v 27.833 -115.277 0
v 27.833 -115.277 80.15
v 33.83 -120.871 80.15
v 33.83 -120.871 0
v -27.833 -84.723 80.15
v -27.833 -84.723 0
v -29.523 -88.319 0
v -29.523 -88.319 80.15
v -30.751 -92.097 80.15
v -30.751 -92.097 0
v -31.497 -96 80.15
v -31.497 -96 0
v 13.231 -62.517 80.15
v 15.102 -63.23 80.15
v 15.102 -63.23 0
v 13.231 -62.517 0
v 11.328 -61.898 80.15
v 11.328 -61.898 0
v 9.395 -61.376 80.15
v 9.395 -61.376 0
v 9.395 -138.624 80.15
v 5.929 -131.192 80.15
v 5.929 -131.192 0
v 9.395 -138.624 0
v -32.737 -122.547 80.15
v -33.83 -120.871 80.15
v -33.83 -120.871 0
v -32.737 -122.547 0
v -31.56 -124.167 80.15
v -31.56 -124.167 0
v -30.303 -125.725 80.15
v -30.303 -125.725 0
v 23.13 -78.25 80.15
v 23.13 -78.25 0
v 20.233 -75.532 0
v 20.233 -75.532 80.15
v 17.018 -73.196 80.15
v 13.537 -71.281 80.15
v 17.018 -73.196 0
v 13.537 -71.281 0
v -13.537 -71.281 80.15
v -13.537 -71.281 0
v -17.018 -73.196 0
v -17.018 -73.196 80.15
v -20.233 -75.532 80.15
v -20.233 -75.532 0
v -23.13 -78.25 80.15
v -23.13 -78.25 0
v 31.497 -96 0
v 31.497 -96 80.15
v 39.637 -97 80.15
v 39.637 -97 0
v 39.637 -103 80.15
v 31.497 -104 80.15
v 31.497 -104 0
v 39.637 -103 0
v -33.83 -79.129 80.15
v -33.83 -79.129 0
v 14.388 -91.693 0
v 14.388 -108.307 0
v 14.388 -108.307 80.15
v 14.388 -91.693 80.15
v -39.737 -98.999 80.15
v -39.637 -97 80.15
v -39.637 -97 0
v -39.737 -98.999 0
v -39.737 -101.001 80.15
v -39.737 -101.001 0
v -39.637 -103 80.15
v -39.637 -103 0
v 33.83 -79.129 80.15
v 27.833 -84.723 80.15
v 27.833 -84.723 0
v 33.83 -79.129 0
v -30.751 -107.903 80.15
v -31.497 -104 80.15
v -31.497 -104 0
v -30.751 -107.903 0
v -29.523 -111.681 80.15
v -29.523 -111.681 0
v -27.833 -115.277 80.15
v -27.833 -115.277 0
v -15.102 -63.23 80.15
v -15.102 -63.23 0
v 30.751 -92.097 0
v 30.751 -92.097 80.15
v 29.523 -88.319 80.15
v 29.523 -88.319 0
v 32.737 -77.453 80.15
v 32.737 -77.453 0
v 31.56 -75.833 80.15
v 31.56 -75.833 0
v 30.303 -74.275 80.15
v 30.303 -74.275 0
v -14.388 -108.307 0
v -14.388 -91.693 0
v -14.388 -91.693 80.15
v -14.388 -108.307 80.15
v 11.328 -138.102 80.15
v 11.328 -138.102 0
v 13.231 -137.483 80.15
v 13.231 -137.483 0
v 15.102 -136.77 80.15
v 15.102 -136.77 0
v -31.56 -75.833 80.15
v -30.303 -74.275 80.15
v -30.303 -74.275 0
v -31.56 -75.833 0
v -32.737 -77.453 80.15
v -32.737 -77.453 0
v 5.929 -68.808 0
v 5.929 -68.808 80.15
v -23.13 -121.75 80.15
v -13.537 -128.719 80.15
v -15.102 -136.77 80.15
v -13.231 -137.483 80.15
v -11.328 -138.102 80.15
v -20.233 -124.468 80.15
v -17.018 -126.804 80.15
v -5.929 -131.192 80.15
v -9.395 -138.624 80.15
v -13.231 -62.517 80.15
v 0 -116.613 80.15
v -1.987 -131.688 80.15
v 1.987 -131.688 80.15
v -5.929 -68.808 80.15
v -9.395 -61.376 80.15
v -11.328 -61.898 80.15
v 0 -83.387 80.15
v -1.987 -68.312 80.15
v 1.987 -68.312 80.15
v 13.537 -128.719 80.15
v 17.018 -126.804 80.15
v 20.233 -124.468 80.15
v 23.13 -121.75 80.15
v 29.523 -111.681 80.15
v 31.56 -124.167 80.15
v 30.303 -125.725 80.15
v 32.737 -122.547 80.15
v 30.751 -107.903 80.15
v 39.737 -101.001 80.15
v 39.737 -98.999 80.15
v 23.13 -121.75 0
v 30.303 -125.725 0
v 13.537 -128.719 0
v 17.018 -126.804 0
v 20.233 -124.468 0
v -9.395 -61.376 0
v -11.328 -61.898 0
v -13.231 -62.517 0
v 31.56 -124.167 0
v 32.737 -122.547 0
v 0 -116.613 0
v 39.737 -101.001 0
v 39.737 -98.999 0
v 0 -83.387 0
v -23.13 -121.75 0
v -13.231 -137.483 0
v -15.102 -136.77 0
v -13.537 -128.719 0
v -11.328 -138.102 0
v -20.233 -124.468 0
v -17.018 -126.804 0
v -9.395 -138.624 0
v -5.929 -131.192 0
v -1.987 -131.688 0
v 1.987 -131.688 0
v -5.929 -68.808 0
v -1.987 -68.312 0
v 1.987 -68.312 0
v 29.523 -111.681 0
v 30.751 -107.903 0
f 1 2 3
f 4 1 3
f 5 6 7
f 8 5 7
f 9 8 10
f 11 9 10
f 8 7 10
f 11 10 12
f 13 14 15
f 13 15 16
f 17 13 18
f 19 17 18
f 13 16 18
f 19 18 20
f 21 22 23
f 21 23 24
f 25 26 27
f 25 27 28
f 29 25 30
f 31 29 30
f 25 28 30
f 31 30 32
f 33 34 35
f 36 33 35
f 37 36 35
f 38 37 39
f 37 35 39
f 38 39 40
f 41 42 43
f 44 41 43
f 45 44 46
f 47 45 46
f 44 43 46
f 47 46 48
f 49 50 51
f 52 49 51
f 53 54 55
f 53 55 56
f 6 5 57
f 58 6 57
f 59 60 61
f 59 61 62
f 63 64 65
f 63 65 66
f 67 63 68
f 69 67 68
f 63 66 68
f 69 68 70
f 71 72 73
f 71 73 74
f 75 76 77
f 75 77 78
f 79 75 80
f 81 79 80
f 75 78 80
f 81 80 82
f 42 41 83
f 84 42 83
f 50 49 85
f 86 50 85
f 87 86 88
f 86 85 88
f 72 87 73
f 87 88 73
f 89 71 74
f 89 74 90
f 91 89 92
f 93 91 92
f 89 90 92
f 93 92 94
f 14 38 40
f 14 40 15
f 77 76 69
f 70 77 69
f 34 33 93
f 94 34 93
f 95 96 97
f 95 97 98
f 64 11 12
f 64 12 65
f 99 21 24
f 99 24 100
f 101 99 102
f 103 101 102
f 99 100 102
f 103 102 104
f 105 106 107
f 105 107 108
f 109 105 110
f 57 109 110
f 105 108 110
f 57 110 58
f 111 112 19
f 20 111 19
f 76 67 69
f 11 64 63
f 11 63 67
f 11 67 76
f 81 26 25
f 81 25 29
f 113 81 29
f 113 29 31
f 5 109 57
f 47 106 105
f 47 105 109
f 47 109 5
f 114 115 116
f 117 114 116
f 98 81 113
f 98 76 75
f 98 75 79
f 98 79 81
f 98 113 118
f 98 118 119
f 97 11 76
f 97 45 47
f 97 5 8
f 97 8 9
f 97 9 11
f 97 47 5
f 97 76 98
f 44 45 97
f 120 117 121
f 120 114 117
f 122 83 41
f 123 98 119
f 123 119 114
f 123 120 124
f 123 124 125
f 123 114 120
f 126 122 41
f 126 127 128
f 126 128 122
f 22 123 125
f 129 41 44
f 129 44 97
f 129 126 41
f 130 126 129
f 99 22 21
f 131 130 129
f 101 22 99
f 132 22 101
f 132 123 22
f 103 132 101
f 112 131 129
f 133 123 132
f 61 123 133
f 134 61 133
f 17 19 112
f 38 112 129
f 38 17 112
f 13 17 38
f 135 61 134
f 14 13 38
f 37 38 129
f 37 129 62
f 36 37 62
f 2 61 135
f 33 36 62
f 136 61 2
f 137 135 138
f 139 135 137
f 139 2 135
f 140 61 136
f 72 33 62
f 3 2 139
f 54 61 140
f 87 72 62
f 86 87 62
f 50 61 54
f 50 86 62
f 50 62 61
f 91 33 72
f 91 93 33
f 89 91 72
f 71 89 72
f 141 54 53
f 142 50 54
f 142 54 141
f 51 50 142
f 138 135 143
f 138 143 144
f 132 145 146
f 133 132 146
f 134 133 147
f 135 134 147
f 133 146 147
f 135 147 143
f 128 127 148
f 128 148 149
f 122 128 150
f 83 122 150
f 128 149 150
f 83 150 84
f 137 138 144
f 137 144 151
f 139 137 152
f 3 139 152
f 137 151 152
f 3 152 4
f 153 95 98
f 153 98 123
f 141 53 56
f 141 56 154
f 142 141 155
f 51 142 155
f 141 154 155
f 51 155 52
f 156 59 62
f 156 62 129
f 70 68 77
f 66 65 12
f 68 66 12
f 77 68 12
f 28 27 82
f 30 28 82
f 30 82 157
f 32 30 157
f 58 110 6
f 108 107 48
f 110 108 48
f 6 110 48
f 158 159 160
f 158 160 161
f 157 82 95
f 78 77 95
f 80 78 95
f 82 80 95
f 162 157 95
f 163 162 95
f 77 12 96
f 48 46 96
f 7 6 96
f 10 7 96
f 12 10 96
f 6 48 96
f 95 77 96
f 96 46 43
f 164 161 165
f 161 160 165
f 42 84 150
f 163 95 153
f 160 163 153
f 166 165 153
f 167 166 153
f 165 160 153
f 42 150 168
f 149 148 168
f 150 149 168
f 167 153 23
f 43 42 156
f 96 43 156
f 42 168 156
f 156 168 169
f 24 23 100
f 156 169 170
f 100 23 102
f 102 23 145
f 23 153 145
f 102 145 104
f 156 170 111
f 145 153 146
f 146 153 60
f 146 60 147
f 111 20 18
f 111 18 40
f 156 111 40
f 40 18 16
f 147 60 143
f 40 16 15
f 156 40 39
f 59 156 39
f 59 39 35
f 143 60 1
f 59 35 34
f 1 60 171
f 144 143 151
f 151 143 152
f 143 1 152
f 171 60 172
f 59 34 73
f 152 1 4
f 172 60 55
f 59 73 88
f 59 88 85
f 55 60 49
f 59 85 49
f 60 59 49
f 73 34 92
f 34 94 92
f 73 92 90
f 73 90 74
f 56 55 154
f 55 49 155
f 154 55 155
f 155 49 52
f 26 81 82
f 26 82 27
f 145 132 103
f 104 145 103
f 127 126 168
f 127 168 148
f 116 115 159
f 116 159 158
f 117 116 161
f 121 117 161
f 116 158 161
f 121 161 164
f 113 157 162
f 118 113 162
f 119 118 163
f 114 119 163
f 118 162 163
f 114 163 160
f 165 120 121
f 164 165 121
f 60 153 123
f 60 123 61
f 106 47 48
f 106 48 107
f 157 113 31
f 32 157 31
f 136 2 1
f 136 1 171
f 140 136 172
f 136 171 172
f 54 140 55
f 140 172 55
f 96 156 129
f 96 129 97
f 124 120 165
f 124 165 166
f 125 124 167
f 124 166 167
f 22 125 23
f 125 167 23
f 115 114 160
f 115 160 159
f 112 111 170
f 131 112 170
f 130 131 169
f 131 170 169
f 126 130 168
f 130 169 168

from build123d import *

# Parameters (mm, degrees)
SKETCH011_R           = 31.75
PAD009_DEPTH          = 80.15
PAD010_DEPTH          = 80.15
POLARPATTERN006_COUNT = 10
POCKET010_DEPTH       = 80.151


with BuildPart() as part:
    # Sketch011 → Pad009 (new body)
    with BuildSketch(Plane.XY):
        Circle(SKETCH011_R)
    extrude(amount=PAD009_DEPTH)

    # Sketch009 → Pad010 (join)
    with BuildSketch(Plane.XY):
        with BuildLine():
            ThreePointArc((39.636631, -3), (39.75, 0), (39.636631, 3))
            Line((31.497024, 4), (39.636631, 3))
            Line((31.497024, 4), (21.166667, 0))
            Line((21.166667, 0), (31.497024, -4))
            Line((31.497024, -4), (39.636631, -3))
        make_face()
    pad010 = extrude(amount=PAD010_DEPTH)

    # PolarPattern006: Pad010 ×10 about axis
    polarpattern006_axis = Axis((0, 0, 0), (0, 0, 1))
    for i in range(1, POLARPATTERN006_COUNT):
        add(pad010.rotate(polarpattern006_axis, i * 360 / POLARPATTERN006_COUNT))

    # Sketch010 → Pocket010 (cut, through all)
    with BuildSketch(Plane.XY):
        Polygon((14.3875, 8.306627), (0, 16.613254), (-14.3875, 8.306627), (-14.3875, -8.306627), (0, -16.613254), (14.3875, -8.306627), align=None)
    extrude(amount=POCKET010_DEPTH, mode=Mode.SUBTRACT)


with BuildPart() as part_1:
    # Body024 placement: moved
    add(part.part.moved(Location((0, -100, 0))))


solid = part_1.part
